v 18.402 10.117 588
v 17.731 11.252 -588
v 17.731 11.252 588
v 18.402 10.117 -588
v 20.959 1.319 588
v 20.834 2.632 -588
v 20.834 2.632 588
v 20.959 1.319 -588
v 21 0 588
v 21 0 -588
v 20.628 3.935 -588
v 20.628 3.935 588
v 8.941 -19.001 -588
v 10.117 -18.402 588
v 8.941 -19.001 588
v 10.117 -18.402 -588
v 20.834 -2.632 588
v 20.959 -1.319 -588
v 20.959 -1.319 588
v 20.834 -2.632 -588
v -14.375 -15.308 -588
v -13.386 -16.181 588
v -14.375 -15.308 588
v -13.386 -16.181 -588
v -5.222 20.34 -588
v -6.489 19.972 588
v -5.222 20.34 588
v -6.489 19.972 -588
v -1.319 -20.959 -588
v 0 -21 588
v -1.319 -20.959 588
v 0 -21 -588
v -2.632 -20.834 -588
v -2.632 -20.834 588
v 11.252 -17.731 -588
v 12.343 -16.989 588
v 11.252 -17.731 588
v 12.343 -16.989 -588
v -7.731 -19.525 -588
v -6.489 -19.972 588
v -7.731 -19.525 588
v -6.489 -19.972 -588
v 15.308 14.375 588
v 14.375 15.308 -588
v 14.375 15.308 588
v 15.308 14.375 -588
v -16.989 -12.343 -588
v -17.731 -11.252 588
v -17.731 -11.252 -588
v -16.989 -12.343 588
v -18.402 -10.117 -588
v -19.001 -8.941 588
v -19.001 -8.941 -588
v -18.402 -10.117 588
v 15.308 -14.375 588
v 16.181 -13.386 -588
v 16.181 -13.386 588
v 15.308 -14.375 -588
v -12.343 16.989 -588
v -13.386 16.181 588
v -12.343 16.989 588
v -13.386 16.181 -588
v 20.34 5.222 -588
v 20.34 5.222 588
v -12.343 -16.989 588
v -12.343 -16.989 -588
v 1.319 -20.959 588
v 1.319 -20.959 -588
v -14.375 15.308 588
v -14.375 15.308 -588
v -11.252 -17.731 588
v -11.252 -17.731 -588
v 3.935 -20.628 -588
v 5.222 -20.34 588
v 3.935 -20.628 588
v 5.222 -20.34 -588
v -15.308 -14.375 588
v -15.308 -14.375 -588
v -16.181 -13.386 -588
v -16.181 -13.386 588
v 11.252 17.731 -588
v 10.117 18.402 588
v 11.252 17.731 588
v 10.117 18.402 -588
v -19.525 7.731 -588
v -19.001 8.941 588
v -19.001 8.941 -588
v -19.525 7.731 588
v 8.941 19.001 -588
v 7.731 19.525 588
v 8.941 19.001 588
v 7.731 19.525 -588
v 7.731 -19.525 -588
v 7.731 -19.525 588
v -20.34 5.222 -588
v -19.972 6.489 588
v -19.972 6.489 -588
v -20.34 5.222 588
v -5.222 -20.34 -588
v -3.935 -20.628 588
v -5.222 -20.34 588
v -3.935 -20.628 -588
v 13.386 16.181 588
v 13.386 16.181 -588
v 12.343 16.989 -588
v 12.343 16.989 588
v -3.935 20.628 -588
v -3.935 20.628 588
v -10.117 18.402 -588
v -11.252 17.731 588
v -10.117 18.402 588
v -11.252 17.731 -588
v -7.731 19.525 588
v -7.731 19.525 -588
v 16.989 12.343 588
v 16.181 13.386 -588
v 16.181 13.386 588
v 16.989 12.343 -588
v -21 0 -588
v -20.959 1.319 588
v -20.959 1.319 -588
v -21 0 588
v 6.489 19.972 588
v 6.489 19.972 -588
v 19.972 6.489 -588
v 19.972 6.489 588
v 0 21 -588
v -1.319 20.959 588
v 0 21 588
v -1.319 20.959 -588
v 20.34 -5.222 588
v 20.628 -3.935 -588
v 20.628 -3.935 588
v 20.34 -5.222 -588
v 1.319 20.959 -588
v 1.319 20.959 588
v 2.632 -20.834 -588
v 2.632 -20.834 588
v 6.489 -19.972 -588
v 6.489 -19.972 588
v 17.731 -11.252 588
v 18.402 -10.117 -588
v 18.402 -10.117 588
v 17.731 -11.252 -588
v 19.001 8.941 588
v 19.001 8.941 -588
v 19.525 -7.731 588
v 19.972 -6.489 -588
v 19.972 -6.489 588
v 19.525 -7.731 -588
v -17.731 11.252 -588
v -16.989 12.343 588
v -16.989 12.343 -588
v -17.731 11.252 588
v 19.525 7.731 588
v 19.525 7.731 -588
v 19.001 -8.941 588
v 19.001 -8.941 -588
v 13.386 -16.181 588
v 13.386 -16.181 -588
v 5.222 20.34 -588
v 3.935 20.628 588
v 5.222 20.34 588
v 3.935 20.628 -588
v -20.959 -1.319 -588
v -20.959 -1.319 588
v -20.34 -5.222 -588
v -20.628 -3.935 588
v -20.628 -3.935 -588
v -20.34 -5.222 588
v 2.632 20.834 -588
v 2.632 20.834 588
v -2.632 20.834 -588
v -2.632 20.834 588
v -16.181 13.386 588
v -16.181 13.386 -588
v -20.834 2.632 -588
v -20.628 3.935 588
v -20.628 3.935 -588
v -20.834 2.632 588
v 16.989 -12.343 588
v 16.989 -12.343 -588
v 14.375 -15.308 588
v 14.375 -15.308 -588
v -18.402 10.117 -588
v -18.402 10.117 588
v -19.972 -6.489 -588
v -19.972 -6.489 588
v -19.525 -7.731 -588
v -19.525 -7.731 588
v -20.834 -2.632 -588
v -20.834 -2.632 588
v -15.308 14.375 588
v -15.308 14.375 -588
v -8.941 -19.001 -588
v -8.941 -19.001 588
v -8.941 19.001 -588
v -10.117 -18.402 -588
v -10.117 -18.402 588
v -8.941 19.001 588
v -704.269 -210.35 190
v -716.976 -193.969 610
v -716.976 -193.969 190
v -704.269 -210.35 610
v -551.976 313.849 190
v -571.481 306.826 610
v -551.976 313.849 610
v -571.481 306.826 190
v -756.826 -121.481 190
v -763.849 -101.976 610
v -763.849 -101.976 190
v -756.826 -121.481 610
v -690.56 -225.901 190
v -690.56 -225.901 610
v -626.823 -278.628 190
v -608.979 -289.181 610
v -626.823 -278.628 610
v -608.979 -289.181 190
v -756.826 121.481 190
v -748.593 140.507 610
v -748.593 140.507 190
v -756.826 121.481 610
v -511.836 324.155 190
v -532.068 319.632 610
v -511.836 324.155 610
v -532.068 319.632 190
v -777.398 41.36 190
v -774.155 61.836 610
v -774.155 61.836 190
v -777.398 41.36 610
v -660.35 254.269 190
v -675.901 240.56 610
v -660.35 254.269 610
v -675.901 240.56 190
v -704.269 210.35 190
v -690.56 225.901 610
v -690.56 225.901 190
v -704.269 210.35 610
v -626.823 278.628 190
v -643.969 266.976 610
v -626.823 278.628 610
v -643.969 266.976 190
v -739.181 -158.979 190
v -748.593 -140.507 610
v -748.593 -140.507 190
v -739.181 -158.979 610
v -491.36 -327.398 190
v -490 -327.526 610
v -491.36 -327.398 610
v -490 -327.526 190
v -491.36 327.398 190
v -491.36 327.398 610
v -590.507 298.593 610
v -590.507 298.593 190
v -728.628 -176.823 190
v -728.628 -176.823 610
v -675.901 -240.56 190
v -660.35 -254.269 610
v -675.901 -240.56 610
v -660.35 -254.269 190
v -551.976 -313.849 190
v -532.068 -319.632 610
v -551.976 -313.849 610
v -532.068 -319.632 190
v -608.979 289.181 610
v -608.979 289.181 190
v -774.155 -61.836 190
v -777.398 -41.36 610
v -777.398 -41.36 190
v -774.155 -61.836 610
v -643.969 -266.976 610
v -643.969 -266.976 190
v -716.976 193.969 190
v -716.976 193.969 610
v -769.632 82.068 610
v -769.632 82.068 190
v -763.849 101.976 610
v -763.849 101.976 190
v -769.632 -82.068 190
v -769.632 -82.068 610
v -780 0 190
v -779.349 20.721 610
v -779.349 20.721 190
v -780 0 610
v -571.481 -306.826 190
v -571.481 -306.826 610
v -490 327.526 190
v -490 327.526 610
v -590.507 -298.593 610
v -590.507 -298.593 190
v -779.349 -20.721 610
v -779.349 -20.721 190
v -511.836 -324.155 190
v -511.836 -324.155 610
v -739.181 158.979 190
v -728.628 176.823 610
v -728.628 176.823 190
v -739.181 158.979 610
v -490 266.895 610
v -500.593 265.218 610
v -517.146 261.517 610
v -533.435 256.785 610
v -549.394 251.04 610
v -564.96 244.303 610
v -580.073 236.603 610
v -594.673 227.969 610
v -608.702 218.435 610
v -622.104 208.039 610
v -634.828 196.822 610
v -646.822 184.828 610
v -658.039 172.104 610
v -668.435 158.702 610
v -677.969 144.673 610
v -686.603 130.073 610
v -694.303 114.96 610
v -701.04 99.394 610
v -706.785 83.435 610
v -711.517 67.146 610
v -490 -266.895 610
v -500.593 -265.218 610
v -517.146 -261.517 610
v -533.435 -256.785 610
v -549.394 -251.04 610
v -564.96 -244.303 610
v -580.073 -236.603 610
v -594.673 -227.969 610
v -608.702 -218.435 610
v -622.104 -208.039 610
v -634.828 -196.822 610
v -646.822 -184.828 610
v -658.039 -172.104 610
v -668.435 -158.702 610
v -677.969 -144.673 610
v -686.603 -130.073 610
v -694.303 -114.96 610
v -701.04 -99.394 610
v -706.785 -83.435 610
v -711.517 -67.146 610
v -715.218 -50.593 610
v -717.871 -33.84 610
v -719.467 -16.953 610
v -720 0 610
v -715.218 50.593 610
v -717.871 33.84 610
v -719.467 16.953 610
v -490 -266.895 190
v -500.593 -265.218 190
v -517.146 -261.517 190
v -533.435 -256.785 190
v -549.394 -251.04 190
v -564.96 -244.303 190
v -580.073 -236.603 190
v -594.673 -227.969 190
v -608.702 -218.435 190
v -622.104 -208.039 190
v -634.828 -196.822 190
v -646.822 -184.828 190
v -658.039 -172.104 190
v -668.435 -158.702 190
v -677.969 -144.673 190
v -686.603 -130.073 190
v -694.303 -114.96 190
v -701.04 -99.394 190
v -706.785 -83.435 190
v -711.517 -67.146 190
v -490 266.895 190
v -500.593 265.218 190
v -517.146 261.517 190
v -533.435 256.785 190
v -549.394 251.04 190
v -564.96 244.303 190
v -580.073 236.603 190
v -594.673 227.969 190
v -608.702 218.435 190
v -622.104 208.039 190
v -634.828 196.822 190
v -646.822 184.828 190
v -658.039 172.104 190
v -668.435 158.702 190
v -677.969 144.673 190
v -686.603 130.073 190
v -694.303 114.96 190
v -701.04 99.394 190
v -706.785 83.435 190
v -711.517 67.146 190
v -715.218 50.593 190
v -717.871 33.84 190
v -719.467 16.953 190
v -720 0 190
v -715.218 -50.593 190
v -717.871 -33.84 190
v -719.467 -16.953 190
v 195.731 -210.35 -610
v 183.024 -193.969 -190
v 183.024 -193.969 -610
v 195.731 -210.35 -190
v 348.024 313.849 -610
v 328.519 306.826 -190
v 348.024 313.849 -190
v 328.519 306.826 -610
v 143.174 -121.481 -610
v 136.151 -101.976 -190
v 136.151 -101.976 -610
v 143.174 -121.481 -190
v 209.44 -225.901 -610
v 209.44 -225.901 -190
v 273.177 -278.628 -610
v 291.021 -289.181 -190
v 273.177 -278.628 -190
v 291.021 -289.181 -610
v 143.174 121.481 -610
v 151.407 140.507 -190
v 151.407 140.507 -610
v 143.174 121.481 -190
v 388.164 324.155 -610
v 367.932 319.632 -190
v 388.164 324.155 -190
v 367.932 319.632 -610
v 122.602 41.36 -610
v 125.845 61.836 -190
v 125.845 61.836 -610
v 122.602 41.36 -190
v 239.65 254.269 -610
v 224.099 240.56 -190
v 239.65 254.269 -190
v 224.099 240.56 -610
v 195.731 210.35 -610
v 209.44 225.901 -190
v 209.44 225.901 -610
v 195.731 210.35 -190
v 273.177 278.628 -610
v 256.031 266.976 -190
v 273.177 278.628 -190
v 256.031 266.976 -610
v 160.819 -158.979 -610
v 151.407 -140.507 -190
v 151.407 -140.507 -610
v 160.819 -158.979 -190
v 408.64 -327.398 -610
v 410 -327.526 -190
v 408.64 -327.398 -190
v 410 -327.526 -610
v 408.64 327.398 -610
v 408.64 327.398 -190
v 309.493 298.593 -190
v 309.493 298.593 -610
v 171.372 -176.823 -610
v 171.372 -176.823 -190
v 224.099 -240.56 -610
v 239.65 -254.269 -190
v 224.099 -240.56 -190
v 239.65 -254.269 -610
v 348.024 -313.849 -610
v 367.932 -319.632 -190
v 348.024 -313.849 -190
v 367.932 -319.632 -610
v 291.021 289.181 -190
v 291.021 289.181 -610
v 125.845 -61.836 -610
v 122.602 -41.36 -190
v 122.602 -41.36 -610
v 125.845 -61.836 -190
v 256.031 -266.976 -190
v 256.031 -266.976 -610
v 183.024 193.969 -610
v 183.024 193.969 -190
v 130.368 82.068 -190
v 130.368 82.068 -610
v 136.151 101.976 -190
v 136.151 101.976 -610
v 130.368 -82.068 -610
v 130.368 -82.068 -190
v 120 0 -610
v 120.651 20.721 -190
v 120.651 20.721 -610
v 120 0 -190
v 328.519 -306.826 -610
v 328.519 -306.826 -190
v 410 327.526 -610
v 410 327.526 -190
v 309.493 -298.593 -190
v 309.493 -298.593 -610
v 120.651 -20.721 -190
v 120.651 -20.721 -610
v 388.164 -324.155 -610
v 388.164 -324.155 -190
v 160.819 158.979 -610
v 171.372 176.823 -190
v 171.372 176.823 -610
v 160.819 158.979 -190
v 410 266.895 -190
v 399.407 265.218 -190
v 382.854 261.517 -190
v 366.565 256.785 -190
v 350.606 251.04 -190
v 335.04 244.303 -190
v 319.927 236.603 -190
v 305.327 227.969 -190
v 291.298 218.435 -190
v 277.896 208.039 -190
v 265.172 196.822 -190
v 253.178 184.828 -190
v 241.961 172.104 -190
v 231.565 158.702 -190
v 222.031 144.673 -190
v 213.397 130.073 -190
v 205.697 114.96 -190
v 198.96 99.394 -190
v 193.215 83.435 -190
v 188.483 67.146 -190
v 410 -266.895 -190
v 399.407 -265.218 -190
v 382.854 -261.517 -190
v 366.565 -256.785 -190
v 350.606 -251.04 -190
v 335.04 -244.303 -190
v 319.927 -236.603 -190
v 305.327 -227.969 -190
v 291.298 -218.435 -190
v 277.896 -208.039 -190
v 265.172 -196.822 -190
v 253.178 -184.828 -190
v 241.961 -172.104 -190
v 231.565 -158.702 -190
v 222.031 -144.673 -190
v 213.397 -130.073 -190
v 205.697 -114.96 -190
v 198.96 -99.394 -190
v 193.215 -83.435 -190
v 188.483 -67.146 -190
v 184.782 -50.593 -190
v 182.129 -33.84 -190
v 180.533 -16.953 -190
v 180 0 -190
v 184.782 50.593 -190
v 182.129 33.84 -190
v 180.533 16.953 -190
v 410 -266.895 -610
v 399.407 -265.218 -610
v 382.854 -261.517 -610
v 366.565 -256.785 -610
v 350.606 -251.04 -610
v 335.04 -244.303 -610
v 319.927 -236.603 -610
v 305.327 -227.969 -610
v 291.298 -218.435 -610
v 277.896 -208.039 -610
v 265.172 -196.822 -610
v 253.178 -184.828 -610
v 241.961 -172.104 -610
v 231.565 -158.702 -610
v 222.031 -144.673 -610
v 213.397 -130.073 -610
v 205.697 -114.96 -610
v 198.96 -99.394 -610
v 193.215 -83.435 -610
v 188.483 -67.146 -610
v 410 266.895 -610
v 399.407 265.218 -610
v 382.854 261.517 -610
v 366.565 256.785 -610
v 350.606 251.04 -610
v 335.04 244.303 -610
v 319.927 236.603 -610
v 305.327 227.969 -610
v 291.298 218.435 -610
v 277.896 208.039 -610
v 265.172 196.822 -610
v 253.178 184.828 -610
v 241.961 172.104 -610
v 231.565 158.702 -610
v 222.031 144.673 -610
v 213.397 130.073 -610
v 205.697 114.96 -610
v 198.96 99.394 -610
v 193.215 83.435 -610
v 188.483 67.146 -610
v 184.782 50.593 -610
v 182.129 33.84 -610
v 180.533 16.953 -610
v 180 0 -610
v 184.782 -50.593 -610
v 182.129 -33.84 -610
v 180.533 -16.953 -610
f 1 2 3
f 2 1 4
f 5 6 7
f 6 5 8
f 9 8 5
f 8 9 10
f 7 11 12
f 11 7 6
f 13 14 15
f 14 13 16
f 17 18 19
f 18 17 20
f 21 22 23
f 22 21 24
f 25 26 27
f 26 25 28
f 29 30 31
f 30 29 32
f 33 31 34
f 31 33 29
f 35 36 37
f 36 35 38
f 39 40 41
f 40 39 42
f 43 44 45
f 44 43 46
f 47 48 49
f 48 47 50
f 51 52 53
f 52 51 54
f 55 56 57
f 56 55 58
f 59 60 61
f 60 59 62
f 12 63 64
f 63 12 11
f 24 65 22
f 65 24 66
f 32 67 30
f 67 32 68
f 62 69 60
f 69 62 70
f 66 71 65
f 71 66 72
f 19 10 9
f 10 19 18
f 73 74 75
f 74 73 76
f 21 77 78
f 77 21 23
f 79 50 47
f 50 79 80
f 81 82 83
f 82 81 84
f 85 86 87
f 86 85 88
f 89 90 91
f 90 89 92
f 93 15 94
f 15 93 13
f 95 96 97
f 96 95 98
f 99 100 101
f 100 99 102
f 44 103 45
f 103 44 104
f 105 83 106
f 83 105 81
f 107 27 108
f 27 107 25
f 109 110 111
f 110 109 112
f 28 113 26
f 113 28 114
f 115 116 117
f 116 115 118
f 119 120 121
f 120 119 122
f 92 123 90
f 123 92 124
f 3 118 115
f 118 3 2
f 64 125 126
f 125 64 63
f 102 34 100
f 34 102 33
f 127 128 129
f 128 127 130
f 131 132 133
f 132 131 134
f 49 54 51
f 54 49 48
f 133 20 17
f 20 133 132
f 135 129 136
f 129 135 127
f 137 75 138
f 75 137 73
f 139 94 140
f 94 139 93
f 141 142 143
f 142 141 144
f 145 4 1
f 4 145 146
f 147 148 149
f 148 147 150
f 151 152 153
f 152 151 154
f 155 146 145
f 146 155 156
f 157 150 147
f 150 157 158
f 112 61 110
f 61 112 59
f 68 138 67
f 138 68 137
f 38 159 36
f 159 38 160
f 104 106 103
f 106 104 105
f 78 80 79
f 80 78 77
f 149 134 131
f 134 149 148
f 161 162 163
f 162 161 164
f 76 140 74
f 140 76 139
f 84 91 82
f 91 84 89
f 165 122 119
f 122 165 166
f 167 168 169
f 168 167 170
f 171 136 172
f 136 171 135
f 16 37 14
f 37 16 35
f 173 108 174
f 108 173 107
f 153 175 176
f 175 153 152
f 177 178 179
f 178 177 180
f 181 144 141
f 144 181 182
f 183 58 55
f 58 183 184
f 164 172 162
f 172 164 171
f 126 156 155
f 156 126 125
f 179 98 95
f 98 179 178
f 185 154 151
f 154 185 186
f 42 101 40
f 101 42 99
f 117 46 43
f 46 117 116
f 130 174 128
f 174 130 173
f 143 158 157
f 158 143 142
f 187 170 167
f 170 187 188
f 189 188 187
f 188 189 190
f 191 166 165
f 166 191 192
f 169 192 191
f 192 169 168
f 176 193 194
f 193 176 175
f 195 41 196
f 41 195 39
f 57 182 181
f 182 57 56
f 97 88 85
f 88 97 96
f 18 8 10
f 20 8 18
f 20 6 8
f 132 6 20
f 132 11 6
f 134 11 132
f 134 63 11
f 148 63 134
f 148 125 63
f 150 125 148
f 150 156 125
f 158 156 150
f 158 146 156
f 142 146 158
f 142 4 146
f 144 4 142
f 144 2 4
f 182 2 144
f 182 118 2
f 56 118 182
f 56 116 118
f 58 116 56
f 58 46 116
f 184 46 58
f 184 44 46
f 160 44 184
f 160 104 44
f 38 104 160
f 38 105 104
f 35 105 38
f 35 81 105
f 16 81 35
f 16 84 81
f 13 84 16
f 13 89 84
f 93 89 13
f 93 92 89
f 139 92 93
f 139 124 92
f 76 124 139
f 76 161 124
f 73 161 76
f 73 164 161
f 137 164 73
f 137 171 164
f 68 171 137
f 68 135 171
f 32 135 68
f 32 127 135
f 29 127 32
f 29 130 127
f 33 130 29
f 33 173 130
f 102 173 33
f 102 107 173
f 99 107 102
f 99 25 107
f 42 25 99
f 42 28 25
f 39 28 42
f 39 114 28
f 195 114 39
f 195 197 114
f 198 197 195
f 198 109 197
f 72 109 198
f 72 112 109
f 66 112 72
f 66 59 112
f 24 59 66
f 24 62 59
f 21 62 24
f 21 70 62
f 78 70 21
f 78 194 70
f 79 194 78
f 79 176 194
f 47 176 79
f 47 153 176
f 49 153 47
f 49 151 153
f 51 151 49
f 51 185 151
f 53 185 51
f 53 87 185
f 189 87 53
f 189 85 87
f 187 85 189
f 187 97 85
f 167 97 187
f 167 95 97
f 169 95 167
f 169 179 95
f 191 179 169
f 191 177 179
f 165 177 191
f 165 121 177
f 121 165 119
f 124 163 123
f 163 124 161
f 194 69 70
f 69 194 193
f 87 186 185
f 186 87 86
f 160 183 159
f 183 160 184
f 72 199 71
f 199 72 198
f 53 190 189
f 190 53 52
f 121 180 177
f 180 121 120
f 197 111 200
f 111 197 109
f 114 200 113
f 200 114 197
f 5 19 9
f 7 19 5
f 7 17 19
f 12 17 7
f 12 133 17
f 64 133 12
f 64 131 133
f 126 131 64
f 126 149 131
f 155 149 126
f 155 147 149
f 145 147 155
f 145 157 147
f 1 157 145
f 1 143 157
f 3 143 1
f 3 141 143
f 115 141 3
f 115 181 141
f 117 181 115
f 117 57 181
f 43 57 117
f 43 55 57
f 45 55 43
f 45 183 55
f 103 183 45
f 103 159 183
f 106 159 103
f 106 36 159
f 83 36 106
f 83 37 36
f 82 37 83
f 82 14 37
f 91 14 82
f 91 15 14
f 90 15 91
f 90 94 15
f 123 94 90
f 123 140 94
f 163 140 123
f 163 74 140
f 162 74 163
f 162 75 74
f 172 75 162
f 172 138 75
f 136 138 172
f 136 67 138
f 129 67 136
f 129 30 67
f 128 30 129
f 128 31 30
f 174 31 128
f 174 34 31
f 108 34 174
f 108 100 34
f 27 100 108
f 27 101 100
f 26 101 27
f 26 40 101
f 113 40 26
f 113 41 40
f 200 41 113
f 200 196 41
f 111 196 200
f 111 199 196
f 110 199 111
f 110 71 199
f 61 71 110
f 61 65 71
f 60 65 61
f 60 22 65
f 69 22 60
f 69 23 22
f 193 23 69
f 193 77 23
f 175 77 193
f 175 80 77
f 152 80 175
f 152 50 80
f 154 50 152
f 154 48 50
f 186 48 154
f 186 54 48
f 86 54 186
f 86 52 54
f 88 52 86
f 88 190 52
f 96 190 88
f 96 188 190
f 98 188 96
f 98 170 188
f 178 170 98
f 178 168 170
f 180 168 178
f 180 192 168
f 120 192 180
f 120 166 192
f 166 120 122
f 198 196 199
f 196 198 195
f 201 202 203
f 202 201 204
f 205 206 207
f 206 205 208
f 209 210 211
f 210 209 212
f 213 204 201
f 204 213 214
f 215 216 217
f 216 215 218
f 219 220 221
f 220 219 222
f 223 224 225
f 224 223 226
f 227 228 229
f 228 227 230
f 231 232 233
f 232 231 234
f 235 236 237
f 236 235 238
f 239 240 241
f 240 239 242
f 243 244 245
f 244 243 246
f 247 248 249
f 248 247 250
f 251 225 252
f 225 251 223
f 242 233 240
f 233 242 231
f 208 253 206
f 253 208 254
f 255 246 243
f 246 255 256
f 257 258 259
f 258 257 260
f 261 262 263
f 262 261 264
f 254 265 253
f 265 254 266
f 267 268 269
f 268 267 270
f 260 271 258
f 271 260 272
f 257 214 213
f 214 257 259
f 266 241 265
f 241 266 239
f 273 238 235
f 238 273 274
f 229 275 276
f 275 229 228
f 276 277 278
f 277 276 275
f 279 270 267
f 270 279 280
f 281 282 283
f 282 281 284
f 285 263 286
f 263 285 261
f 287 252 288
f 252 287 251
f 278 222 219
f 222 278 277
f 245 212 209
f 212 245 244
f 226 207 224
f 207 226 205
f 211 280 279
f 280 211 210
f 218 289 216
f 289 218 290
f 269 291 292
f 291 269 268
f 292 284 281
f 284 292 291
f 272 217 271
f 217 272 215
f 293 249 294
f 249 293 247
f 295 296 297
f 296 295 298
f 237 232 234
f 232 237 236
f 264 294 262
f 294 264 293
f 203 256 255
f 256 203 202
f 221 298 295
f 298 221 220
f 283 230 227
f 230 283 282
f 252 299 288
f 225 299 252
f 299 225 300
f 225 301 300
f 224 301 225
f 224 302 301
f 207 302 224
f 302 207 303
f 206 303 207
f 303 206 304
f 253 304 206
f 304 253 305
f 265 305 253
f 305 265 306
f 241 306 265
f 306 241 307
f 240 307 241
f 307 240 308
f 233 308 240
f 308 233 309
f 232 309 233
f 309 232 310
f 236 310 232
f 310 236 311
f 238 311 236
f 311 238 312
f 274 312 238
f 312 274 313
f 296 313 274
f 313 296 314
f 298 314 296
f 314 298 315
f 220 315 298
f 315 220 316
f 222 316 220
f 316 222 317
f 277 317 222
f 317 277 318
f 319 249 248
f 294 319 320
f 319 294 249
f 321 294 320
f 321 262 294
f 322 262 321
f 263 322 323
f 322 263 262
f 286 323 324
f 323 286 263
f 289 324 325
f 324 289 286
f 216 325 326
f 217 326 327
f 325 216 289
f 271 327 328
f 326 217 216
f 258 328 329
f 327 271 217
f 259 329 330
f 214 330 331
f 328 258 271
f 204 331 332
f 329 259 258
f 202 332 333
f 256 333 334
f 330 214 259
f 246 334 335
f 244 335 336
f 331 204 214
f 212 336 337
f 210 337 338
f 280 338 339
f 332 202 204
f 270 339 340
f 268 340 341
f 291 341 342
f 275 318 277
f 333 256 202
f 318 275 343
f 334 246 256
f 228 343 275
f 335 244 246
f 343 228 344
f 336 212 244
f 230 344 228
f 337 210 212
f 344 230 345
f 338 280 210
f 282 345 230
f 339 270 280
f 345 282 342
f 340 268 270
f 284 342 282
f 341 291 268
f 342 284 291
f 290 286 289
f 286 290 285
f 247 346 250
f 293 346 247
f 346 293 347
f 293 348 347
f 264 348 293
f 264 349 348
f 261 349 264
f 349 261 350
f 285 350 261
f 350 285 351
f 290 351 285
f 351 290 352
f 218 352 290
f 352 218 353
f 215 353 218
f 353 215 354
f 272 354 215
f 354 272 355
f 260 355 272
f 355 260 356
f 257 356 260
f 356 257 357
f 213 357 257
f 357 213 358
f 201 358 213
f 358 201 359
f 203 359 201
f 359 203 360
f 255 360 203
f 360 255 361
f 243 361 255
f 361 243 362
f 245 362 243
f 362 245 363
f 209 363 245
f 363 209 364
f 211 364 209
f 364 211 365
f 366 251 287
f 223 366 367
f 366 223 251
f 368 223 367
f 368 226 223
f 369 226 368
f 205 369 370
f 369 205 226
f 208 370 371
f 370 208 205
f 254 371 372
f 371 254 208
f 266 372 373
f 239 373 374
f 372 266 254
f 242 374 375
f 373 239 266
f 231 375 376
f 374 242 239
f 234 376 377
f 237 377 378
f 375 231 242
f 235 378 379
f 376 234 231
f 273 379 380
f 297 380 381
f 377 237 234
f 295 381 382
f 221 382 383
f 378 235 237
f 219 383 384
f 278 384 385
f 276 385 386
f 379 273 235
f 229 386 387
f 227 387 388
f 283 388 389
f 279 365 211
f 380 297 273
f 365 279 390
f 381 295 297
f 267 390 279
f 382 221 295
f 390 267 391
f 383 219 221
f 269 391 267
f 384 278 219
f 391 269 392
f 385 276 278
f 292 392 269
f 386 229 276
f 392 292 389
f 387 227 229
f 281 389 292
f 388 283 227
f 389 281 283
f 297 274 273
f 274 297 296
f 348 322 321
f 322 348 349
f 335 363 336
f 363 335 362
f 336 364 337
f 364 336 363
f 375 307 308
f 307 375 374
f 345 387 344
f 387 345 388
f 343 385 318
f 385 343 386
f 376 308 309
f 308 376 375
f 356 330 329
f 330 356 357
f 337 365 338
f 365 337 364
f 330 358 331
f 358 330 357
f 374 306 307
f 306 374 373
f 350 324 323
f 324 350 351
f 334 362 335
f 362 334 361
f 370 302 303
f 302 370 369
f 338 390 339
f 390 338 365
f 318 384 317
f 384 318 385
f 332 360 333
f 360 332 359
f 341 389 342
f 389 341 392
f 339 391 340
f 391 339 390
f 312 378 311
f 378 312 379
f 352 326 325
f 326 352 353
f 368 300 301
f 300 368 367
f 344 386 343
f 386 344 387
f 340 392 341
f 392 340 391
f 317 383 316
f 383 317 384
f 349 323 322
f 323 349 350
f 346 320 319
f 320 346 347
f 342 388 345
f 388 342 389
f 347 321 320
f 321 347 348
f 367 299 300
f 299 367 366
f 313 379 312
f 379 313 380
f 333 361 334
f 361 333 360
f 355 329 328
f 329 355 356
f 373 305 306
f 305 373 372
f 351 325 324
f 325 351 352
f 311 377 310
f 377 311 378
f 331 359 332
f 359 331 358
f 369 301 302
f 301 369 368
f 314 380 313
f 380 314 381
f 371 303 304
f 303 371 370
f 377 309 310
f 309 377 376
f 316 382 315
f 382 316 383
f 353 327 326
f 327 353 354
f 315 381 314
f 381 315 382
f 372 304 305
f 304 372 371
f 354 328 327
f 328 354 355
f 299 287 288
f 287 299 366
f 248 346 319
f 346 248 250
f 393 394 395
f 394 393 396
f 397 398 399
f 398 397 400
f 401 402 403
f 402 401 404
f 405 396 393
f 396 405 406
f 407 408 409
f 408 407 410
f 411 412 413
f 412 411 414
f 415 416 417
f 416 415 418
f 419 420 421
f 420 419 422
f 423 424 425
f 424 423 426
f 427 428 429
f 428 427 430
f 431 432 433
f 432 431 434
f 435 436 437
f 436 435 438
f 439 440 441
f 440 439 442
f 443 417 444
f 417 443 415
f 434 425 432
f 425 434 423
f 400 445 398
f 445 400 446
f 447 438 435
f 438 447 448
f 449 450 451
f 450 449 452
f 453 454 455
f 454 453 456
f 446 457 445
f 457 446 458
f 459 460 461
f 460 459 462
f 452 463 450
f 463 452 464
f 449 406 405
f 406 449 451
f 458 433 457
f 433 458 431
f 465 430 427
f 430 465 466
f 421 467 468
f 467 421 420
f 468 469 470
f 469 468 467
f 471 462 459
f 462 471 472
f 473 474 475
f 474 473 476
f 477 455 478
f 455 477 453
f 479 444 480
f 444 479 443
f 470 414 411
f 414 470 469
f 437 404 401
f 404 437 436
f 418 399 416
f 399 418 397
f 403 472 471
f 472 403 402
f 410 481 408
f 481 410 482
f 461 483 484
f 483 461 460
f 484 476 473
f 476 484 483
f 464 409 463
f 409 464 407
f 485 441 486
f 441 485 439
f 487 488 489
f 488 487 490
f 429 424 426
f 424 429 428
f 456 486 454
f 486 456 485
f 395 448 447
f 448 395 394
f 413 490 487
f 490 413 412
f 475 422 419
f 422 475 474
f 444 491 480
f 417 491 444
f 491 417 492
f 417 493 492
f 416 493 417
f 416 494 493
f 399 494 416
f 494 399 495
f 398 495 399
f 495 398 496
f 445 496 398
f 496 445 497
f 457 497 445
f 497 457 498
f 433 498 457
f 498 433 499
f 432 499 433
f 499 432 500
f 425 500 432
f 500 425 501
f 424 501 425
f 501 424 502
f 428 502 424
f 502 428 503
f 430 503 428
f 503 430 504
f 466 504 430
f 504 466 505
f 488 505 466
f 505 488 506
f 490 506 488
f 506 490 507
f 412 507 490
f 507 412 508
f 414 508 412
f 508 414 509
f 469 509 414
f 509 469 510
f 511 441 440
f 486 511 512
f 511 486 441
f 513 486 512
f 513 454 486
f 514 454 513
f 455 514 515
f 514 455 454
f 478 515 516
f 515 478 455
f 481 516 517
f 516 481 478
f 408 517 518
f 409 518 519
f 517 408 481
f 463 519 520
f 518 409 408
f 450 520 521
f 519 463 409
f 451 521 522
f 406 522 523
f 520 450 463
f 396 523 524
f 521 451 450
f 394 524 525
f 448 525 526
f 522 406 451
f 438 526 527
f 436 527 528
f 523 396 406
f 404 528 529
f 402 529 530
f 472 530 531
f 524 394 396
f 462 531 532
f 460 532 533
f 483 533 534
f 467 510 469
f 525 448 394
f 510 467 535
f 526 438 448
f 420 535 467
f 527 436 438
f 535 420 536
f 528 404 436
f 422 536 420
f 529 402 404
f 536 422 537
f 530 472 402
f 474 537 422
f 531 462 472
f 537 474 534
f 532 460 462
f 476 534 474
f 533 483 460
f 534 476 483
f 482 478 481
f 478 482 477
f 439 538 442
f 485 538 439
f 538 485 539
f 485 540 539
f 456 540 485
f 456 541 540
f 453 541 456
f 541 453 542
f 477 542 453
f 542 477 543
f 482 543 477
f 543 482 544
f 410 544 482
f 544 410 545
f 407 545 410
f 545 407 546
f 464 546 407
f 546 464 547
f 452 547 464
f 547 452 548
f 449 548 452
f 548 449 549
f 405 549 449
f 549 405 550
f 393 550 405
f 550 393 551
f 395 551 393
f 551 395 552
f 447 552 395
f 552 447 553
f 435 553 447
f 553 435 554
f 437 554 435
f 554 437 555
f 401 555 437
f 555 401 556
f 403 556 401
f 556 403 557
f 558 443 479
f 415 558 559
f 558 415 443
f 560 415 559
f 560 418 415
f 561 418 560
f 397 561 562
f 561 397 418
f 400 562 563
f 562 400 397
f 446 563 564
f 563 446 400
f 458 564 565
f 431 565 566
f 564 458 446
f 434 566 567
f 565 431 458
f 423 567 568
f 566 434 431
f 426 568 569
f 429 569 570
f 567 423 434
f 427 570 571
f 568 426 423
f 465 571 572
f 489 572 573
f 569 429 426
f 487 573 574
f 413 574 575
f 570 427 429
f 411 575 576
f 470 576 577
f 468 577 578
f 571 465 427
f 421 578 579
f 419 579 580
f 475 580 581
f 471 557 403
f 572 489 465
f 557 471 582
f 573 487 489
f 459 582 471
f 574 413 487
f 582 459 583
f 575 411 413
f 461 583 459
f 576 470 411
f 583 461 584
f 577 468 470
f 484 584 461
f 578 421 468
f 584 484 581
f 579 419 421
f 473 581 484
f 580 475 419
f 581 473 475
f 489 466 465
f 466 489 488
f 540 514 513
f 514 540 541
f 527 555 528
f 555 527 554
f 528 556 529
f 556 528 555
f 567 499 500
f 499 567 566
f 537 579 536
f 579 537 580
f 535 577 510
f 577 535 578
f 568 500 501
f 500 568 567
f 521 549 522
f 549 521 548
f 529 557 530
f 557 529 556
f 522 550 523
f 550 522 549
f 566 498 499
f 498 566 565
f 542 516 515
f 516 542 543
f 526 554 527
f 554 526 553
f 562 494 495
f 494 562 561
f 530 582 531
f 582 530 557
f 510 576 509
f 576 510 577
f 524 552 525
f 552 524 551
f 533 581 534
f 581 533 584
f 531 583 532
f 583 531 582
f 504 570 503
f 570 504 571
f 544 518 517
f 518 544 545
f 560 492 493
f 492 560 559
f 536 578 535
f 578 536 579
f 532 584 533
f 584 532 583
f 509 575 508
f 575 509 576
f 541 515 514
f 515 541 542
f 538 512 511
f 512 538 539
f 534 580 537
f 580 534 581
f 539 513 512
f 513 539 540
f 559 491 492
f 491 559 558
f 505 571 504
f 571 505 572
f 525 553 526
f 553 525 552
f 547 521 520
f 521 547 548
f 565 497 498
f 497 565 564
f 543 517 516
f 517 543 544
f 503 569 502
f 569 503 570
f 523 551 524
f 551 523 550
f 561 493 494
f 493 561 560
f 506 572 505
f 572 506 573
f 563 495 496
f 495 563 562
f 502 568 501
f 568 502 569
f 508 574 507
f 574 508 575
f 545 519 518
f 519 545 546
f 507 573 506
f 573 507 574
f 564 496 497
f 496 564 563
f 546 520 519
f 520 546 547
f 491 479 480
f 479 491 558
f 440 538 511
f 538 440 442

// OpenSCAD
// ============================================================================
// PROJECT: XXXG-00W0 WING GUNDAM ZERO EW - LOWER airframe INTEGRATION
// COMPONENT VAULT: BANDAI CAST RUNNER H - ANKLE SWIVELS H14 & H15
// MANUFACTURING SPECS: SOLID-STATE CAST-IN INDUCTIVE POWER HARNESS TERMINALS
// DESIGN PARITY: 5,200 Nm TORQUE LOAD COMPLIANCE FOR 16.7M BI-PEDAL AIRFRAME
// ============================================================================

$fn = 100; // Circular segment rendering resolution count

// Structural Constants Scaled 1:1 for a 16.7-Meter Airframe Scale (mm)
swivel_ring_height = 420;               // Total vertical thickness of swivel block (mm)
cycloidal_bore_diameter = 540;          // Inner cycloidal reduction ring bore (mm)
titanium_armor_wall = 60;               // Solid TiAl protective wall thickness (mm)
harness_conduit_width = 80;             // Cast-in 4oz copper logic trace track (mm)

module Runner_H_Ankle_Swivel_Forge() {
    // Central Supply Injection Runner Axis (Molten Feed Line from Siphon Forge)
    color([0.22, 0.22, 0.25]) {
        cylinder(h = swivel_ring_height * 2.8, d = 42, center = true);
        // Direct injection gates tracking straight into the part mold cavities
        translate() rotate() cylinder(h = 400, d = 22);
        translate([0, 0, -400]) rotate() cylinder(h = 400, d = 22);
    }
    
    // Instantiate Scaled Structural Molds Symmetrically (Left & Right Halves)
    Cast_Ankle_Swivel_Framework();
}

module Cast_Ankle_Swivel_Framework() {
    // ---- PART H14: LOWER LEFT ANKLE ROTATIONAL COUPLING COLLAR ---- [Page 6, Step 2]
    translate([-450, 0, 400]) color([0.45, 0.45, 0.48]) { // Inner Frame Dark Spec
        difference() {
            // Main high-strength structural swivel casing block
            cylinder(h = swivel_ring_height, d = cycloidal_bore_diameter + (titanium_armor_wall * 2), center = true);
            
            // Central Cycloidal Reduction Track Bore (Houses pre-loaded rolling pins)
            cylinder(h = swivel_ring_height + 20, d = cycloidal_bore_diameter, center = true);
            
            // Continuous cast-in routing track for the 4oz solid-state wiring rails
            cube([harness_conduit_width, cycloidal_bore_diameter + 150, swivel_ring_height + 10], center = true);
            
            // Slicing profile tool to generate an asymmetrical half-shell part component
            translate([cycloidal_bore_diameter, 0, 0])
                cube([cycloidal_bore_diameter * 2, cycloidal_bore_diameter * 2, swivel_ring_height * 2], center = true);
        }
    }
    
    // ---- PART H15: LOWER RIGHT ANKLE ROTATIONAL COUPLING COLLAR ---- [Page 6, Step 1]
    translate([450, 0, -400]) rotate() color([0.45, 0.45, 0.48]) {
        difference() {
            cylinder(h = swivel_ring_height, d = cycloidal_bore_diameter + (titanium_armor_wall * 2), center = true);
            cylinder(h = swivel_ring_height + 20, d = cycloidal_bore_diameter, center = true);
            cube([harness_conduit_width, cycloidal_bore_diameter + 150, swivel_ring_height + 10], center = true);
            translate([cycloidal_bore_diameter, 0, 0])
                cube([cycloidal_bore_diameter * 2, cycloidal_bore_diameter * 2, swivel_ring_height * 2], center = true);
        }
    }
}

// Render Master Assembly to Parameter Workspace
Runner_H_Ankle_Swivel_Forge();
